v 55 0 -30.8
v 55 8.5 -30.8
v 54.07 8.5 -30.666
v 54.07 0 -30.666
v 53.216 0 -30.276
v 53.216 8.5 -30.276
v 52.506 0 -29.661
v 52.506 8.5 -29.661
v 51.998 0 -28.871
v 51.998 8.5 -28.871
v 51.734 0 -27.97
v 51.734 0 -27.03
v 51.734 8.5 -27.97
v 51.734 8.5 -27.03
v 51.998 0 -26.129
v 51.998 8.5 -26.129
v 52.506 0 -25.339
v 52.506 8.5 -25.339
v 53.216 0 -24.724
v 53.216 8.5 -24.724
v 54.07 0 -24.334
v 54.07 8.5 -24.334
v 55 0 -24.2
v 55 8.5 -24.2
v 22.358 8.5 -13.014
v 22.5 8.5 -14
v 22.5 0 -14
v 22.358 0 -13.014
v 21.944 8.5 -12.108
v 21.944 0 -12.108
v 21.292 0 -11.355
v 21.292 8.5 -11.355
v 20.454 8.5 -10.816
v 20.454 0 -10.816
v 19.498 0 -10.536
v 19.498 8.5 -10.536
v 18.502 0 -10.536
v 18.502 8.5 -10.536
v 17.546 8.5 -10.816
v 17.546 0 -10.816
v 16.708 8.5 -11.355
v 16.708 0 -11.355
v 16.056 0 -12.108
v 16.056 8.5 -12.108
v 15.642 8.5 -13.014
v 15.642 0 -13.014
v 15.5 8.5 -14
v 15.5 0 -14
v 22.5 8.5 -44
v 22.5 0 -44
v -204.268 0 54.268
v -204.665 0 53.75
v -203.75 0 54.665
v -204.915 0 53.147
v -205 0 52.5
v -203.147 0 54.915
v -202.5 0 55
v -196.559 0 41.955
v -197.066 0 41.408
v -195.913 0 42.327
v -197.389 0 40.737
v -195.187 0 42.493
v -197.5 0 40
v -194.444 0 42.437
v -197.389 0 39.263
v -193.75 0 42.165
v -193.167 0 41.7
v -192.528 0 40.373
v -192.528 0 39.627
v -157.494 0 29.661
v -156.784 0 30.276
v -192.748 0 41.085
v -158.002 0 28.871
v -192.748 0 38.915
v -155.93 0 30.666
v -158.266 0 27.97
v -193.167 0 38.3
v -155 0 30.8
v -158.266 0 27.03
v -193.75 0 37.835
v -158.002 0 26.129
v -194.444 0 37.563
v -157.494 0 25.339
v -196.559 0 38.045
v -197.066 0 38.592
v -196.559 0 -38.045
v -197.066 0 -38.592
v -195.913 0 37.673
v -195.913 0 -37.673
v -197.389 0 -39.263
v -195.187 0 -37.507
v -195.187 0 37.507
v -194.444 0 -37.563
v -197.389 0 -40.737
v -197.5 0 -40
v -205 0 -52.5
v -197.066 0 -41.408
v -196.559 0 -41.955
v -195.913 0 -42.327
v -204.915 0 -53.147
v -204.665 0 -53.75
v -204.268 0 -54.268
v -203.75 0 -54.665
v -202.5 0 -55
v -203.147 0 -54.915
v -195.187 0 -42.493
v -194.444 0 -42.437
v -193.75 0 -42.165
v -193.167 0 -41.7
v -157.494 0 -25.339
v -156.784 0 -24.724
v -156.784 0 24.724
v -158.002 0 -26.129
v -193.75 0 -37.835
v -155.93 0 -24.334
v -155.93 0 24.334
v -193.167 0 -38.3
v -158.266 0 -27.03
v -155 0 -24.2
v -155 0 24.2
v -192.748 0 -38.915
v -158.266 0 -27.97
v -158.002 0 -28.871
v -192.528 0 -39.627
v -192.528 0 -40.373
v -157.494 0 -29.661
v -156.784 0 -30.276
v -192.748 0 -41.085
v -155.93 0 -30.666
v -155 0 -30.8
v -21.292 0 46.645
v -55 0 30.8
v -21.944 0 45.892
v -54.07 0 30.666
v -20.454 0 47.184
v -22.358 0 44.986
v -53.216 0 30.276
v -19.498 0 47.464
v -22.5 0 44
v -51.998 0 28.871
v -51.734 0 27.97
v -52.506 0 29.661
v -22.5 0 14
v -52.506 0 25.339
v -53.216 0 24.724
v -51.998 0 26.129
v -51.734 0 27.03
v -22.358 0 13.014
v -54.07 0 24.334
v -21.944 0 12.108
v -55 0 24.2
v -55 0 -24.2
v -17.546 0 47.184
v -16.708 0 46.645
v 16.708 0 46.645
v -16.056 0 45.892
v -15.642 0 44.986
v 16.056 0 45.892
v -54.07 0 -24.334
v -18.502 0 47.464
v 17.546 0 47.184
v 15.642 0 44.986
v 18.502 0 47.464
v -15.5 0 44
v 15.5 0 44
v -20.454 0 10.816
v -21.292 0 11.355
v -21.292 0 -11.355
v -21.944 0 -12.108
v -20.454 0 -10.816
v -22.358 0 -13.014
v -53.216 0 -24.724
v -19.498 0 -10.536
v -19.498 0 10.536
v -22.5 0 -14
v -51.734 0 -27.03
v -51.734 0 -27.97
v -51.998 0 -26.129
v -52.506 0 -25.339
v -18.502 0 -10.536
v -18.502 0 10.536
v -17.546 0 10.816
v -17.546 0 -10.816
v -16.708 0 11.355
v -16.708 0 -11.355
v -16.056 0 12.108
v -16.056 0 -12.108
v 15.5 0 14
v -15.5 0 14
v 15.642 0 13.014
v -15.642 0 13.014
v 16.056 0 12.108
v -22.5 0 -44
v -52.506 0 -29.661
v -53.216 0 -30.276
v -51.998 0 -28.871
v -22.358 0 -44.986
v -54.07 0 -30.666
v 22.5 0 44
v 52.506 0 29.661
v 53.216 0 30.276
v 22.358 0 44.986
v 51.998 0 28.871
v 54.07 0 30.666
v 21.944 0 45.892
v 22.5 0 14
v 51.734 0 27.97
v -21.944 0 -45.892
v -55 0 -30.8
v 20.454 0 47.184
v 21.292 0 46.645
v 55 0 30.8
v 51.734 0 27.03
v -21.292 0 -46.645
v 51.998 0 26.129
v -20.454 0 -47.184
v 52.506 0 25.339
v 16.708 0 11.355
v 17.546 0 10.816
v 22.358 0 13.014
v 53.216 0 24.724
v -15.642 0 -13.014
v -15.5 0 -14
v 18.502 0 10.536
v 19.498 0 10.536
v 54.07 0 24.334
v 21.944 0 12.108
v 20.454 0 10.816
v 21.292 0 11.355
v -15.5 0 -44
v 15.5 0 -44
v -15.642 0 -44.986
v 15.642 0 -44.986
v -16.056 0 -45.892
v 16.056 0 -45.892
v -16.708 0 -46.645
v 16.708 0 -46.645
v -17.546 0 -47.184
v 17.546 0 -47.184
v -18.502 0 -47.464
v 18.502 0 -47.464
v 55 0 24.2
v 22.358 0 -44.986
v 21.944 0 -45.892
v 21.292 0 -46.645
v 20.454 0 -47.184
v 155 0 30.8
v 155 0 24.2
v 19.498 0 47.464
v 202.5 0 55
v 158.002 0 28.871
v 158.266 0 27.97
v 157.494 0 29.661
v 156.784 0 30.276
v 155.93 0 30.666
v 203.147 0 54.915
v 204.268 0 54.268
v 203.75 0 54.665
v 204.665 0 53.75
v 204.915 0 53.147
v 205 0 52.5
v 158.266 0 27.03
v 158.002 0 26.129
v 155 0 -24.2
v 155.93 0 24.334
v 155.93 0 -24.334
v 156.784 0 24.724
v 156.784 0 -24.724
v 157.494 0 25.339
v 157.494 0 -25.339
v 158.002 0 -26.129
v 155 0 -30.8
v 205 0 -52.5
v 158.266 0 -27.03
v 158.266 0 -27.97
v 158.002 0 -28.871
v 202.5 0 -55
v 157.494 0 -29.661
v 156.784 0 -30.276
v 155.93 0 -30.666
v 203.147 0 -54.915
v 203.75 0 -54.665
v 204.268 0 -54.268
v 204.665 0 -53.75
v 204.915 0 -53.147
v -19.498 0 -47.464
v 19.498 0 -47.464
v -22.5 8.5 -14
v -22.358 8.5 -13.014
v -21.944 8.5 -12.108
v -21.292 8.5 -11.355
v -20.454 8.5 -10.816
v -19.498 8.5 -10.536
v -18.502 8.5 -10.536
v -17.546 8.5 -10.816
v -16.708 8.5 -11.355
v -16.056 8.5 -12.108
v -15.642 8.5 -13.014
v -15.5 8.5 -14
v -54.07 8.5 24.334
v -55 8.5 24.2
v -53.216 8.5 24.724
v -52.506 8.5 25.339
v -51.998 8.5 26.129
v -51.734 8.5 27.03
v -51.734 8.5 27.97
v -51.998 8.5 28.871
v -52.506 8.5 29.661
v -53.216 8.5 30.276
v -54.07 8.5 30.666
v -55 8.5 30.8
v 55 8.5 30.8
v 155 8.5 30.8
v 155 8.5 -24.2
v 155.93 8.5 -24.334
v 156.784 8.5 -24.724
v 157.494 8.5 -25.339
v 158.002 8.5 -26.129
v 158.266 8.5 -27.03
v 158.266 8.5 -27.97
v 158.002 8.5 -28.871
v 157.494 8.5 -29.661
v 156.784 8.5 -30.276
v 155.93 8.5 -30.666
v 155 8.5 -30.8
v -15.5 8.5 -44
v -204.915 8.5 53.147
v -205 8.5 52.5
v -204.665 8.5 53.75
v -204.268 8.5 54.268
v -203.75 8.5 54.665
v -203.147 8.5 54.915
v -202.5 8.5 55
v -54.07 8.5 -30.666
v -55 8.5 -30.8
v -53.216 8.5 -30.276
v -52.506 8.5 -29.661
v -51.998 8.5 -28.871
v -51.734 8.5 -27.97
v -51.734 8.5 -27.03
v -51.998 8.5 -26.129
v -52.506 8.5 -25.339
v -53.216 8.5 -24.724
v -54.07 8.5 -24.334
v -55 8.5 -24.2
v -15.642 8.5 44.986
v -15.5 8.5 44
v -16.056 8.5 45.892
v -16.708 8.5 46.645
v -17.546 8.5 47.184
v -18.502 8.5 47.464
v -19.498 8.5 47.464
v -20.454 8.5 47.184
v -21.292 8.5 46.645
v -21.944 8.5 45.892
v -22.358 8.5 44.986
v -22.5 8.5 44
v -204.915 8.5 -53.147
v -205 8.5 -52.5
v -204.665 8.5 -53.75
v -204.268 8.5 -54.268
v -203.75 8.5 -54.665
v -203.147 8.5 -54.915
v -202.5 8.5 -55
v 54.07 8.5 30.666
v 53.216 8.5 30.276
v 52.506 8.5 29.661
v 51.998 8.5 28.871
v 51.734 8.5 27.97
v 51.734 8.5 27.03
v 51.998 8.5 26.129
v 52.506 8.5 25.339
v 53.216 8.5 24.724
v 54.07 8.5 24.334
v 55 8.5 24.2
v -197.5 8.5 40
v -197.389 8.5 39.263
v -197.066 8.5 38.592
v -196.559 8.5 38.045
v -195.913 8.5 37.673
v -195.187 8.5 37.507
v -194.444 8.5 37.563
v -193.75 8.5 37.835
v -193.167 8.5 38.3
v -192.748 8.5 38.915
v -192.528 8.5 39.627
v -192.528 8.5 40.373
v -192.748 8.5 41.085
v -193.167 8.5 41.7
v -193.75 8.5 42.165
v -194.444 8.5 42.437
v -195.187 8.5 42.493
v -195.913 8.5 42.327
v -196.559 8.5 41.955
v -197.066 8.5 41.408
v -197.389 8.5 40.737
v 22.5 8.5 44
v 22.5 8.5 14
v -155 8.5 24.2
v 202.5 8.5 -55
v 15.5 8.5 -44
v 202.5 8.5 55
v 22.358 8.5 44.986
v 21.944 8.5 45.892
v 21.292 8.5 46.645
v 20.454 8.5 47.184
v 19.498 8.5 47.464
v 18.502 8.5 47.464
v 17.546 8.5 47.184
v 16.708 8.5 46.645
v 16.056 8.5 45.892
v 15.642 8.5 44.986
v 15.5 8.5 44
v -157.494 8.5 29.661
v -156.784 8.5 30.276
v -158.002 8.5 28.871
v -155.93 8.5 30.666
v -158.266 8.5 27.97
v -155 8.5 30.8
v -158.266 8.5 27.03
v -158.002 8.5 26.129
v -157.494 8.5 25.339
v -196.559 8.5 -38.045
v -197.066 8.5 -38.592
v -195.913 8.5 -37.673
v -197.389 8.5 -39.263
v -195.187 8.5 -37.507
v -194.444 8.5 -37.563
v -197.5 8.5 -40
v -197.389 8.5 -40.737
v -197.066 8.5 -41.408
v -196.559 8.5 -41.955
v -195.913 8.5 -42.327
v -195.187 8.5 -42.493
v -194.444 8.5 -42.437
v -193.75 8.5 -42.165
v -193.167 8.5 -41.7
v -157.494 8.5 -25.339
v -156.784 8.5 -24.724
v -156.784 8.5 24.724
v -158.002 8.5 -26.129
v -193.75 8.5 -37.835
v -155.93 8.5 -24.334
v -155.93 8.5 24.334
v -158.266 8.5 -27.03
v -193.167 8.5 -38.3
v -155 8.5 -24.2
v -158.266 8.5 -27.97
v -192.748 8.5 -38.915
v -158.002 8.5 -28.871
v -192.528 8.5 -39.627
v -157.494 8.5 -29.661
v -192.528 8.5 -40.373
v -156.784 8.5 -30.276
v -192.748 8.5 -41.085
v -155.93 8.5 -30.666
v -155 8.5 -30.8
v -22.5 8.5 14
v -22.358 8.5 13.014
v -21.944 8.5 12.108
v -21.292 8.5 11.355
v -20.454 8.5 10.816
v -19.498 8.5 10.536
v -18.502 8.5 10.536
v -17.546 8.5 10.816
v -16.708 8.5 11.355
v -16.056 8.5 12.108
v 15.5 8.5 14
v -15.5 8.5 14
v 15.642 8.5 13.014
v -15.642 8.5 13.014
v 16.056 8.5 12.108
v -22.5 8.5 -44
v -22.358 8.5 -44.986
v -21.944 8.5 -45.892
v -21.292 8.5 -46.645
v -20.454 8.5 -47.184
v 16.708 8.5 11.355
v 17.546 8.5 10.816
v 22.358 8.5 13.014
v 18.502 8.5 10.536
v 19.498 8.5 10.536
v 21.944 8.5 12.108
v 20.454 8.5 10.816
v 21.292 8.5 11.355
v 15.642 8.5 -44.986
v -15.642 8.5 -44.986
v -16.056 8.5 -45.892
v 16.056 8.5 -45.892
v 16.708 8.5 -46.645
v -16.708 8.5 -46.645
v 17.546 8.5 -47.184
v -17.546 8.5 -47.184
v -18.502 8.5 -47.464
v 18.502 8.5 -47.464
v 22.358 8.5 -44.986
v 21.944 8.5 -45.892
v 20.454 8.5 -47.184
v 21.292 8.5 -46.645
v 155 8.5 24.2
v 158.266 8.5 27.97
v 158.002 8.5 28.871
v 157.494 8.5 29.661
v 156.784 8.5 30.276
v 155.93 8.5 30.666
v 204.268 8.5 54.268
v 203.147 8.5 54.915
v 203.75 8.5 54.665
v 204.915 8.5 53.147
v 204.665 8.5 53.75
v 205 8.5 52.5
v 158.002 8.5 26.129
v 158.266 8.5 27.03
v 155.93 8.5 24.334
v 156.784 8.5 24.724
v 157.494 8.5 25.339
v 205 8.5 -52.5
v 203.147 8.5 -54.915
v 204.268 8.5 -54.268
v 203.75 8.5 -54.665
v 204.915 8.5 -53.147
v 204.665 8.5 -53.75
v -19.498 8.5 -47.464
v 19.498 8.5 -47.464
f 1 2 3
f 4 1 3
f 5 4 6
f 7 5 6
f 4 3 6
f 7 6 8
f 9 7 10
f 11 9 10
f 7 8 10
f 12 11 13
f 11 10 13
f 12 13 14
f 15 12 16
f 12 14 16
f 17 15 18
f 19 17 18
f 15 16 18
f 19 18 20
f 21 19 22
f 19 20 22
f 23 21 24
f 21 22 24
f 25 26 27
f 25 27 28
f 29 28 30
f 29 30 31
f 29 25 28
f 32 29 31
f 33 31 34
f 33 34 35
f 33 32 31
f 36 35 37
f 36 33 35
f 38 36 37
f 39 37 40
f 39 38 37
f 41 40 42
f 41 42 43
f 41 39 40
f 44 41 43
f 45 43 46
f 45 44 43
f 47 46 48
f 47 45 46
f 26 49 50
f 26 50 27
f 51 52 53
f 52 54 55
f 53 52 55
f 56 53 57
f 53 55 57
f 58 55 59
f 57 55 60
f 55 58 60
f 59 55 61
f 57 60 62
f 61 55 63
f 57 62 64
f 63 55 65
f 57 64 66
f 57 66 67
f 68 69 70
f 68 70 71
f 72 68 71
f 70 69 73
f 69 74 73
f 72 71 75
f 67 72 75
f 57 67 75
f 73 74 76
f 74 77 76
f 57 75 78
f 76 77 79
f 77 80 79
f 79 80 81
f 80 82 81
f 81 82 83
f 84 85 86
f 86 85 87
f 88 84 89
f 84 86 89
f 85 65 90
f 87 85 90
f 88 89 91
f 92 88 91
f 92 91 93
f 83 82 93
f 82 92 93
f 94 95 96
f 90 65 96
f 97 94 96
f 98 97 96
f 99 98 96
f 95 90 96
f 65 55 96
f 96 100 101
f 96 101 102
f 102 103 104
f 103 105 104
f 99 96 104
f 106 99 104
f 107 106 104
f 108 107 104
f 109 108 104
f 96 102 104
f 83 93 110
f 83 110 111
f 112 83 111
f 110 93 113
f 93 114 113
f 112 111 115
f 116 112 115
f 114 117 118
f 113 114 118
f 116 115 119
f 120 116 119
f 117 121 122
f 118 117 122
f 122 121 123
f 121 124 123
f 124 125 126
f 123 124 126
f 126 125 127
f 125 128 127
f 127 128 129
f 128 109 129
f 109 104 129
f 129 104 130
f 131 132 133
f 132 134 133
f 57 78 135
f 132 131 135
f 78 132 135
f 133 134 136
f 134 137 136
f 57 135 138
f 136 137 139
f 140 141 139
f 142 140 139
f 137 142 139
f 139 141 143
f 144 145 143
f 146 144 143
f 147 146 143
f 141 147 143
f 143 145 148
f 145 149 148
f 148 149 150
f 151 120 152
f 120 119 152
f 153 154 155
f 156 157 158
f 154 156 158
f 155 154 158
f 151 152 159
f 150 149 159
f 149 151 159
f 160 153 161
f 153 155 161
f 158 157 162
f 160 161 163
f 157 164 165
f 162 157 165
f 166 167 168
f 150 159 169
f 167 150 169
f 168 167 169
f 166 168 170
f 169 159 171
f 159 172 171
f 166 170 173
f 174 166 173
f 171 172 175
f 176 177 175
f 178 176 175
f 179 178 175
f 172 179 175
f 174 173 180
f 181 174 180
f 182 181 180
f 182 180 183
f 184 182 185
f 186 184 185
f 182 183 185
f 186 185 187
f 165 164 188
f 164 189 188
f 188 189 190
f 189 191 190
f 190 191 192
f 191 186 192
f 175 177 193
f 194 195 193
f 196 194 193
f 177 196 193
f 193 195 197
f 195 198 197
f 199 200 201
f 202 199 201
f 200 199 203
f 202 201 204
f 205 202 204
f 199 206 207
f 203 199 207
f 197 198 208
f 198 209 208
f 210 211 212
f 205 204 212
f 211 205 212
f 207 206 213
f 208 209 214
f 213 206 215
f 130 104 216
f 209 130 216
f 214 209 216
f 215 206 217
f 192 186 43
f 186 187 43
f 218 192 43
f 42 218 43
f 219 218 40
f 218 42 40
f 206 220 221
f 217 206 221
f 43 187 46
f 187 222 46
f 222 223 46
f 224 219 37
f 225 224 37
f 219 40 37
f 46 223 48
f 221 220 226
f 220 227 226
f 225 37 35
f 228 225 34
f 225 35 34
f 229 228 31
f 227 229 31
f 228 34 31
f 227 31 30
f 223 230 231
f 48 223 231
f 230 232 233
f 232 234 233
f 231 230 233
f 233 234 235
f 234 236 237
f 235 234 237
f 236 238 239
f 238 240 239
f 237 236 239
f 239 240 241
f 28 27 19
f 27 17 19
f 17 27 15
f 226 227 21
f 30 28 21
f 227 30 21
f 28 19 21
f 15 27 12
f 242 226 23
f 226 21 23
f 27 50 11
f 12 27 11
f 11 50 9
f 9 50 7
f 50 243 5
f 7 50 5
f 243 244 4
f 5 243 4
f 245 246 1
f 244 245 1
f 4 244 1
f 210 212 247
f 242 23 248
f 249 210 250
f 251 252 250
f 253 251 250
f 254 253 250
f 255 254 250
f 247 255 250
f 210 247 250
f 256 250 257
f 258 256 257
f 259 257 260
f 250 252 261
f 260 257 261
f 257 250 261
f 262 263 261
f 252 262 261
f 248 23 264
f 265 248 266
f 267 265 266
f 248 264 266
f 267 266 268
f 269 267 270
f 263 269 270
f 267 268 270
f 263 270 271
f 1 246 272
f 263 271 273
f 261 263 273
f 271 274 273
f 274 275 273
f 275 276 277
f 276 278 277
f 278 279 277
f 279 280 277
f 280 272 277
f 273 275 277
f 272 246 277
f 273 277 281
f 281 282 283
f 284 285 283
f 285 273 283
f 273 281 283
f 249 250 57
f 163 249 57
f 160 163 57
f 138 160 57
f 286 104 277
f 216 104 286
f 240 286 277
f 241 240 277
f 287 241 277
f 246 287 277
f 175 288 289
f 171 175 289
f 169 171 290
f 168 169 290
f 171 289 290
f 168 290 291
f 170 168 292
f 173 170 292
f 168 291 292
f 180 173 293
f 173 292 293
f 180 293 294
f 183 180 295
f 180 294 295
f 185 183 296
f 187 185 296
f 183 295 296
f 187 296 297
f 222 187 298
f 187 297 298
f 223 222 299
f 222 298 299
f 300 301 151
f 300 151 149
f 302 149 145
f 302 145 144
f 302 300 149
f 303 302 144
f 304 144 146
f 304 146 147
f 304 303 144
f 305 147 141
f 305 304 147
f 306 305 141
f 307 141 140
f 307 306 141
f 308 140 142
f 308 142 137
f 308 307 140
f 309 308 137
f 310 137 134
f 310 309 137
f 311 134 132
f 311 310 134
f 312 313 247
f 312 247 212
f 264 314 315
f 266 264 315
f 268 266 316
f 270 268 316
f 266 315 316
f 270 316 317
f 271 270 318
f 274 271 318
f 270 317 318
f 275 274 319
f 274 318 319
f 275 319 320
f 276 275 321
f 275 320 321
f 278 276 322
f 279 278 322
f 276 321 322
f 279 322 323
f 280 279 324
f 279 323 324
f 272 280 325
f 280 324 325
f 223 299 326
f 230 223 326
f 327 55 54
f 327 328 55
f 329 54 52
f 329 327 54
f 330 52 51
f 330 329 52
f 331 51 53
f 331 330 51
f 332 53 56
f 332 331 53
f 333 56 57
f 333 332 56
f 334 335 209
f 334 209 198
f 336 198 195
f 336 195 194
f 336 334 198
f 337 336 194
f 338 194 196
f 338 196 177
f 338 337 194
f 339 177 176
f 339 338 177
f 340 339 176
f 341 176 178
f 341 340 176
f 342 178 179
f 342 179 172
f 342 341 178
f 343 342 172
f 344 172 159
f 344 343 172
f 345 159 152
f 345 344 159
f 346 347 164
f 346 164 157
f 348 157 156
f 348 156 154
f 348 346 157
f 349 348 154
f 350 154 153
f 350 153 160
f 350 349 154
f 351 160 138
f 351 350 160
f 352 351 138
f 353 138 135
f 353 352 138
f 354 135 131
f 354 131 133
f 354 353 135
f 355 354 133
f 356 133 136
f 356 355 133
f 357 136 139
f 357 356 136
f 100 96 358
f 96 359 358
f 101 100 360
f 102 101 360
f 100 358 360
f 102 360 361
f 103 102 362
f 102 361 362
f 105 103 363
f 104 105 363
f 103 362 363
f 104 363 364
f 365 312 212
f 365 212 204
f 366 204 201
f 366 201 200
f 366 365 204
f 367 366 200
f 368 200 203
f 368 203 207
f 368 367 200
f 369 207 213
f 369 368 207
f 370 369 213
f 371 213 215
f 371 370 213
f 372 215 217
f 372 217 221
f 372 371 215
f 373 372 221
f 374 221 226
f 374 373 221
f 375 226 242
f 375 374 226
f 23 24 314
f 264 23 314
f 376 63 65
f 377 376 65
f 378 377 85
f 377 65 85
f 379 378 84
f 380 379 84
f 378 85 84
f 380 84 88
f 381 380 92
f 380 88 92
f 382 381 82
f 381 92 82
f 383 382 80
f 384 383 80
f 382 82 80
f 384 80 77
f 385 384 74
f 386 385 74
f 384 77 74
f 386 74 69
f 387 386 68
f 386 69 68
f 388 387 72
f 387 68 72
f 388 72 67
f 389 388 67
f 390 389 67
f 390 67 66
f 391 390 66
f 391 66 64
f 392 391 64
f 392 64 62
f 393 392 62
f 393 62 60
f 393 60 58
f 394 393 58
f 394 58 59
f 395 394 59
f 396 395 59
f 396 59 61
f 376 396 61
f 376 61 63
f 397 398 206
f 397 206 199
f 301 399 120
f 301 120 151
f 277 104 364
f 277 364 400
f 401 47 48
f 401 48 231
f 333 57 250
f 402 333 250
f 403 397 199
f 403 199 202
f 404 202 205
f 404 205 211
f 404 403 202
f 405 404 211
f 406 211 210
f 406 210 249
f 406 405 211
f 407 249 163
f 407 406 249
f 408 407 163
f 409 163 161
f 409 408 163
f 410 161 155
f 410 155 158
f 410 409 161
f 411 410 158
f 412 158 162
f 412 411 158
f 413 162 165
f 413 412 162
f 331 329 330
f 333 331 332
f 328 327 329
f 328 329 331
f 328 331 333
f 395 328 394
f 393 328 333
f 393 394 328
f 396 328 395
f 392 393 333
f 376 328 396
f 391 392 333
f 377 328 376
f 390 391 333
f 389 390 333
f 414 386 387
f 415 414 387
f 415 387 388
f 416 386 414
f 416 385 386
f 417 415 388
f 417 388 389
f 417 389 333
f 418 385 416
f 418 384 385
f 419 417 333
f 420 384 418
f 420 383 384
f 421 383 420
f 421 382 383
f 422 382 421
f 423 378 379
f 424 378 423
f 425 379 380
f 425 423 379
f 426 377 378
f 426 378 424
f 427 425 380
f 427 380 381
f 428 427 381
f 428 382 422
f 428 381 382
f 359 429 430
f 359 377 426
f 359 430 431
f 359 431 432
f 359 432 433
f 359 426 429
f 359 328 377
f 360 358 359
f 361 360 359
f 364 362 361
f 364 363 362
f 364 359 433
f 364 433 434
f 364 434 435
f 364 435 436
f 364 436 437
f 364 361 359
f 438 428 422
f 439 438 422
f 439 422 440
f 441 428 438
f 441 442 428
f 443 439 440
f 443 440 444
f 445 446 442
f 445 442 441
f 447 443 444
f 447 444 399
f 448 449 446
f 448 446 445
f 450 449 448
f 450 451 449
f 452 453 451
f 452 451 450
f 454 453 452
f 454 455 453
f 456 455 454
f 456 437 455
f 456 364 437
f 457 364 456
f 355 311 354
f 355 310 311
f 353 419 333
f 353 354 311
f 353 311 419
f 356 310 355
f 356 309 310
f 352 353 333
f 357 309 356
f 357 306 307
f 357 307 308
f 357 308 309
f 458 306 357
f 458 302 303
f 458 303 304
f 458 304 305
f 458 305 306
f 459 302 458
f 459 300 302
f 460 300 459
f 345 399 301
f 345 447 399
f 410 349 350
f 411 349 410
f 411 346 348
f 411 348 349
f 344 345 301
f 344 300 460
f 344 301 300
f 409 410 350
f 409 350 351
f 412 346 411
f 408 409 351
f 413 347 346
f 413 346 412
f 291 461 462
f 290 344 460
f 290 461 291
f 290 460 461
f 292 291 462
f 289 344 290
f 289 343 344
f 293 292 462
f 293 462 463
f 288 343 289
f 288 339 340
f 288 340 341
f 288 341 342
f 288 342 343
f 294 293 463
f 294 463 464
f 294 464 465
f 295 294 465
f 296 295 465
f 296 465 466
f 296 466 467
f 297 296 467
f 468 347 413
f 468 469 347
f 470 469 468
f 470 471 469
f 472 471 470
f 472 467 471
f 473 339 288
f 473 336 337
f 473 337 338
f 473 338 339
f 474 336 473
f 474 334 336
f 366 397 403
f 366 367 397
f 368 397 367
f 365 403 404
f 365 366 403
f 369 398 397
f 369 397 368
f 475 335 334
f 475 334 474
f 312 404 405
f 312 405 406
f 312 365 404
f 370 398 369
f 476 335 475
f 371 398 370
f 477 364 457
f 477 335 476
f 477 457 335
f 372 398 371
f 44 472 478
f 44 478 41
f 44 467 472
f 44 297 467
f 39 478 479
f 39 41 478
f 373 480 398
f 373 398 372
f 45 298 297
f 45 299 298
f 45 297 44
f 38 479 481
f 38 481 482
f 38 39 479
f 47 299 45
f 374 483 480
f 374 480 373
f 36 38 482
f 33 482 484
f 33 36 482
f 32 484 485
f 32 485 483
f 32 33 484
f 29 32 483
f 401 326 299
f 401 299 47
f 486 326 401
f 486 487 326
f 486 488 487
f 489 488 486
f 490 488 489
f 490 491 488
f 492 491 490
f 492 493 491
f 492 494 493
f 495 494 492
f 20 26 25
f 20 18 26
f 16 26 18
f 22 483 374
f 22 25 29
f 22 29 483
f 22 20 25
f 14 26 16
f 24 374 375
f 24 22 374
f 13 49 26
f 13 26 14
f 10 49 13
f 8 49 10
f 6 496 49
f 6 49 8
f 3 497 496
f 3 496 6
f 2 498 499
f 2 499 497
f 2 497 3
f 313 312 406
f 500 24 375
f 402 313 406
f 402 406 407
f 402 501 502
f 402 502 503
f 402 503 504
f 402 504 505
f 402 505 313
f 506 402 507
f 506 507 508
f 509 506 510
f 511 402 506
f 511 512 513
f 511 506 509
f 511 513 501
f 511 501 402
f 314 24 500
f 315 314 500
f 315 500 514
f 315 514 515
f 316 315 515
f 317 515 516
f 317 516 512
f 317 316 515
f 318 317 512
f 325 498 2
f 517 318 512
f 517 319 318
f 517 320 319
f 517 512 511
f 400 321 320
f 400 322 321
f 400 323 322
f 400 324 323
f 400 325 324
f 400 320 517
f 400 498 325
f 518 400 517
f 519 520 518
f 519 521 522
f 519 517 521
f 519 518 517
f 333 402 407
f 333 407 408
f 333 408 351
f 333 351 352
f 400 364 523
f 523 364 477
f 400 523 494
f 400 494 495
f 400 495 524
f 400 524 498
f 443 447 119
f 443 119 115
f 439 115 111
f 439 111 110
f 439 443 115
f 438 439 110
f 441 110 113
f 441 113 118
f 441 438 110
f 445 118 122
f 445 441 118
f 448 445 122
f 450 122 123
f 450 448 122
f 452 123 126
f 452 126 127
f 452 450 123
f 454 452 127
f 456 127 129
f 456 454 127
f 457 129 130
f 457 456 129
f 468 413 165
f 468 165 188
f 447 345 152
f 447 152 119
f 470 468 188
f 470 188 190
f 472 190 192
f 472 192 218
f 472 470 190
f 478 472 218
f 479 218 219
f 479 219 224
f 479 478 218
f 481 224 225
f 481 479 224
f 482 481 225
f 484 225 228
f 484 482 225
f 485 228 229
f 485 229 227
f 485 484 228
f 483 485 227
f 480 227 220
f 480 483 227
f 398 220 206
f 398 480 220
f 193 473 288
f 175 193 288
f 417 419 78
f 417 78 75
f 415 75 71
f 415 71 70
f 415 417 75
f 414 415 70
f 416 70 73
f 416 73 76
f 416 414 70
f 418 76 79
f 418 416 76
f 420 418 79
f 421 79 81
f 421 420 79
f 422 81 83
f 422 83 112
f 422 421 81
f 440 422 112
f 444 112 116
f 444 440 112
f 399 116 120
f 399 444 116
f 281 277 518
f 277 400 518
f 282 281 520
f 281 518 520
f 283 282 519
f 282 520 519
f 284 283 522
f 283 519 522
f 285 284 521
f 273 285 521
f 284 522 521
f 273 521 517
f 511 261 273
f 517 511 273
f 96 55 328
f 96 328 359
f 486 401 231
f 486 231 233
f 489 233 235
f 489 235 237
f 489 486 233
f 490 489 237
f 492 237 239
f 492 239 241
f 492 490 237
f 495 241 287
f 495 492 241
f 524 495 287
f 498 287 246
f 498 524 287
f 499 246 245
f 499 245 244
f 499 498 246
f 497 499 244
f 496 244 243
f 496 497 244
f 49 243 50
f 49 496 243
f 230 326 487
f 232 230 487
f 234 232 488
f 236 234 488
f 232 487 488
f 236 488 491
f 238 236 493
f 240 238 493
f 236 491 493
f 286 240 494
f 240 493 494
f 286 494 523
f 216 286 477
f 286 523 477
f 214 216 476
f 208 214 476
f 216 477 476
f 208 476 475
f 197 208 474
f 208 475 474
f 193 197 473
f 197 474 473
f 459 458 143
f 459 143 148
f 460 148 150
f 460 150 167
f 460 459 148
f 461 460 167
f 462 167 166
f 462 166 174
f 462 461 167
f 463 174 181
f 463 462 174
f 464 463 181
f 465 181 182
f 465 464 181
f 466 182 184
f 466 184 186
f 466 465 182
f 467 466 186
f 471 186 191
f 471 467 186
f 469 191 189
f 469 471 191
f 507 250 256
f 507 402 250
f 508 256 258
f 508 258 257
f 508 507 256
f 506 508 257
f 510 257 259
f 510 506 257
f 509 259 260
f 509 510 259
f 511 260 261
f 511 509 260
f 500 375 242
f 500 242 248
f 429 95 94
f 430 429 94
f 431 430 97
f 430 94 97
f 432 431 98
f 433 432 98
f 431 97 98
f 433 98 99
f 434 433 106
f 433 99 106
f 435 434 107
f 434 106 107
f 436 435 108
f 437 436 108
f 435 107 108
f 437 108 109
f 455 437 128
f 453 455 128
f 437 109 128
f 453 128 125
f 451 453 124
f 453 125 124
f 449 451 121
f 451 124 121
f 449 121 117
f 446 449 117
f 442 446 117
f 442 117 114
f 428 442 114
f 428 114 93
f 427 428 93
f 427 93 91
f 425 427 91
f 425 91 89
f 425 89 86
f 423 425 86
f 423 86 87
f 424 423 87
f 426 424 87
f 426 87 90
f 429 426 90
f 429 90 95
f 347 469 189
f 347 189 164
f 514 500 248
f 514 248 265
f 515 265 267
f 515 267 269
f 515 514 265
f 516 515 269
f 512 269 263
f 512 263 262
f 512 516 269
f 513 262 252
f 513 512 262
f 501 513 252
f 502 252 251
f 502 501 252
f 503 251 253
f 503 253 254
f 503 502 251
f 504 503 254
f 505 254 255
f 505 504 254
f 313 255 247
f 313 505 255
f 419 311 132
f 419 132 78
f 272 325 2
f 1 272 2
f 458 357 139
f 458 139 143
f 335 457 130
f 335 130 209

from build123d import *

# Parameters (mm, degrees)
SKETCH1_W            = 410
SKETCH1_H            = 110
BOSS_EXTRUDE1_DEPTH  = 8.5
M4_CLEARANCE_HOLE1_D = 5
M6_CLEARANCE_HOLE1_D = 7
FILLET1_R            = 2.5
CUT_EXTRUDE1_DEPTH   = 8.5
CUT_EXTRUDE2_DEPTH   = 8.5


with BuildPart() as part:
    # Sketch1 → Boss-Extrude1 (new body)
    with BuildSketch(Plane(origin=(0, 0, 0), x_dir=(1, 0, 0), z_dir=(0, 1, 0))):
        Rectangle(SKETCH1_W, SKETCH1_H)
    extrude(amount=BOSS_EXTRUDE1_DEPTH)

    # M4 Clearance Hole1 (through all)
    with Locations(Plane(origin=(0, 8.5, 0), x_dir=(1, 0, 0), z_dir=(0, 1, 0))):
        with Locations((-195, -40), (-195, 40)):
            Hole(M4_CLEARANCE_HOLE1_D / 2)

    # M6 Clearance Hole1 (through all)
    with Locations(Plane(origin=(0, 8.5, 0), x_dir=(1, 0, 0), z_dir=(0, 1, 0))):
        with Locations((19, 34), (19, -34), (-19, -34), (-19, 34)):
            Hole(M6_CLEARANCE_HOLE1_D / 2)

    # Fillet1
    fillet1_edges = [part.edges().sort_by_distance(p)[0] for p in [
        (205, 4.25, 55),
        (-205, 4.25, 55),
        (-205, 4.25, -55),
        (205, 4.25, -55),
    ]]
    fillet(fillet1_edges, radius=FILLET1_R)

    # Sketch6 → Cut-Extrude1 (cut)
    with BuildSketch(Plane(origin=(0, 8.5, 0), x_dir=(1, 0, 0), z_dir=(0, 1, 0))):
        with BuildLine():
            Line((-22.5, 34), (-22.5, 14))
            ThreePointArc((-22.5, 14), (-19, 10.5), (-15.5, 14))
            Line((-15.5, 14), (-15.5, 34))
            Line((-15.5, 34), (-15.5, 44))
            ThreePointArc((-15.5, 44), (-19, 47.5), (-22.5, 44))
            Line((-22.5, 44), (-22.5, 34))
        make_face()
        with BuildLine():
            Line((22.5, 34), (22.5, 14))
            ThreePointArc((22.5, 14), (19, 10.5), (15.5, 14))
            Line((15.5, 14), (15.5, 34))
            Line((15.5, 34), (15.5, 44))
            ThreePointArc((15.5, 44), (19, 47.5), (22.5, 44))
            Line((22.5, 44), (22.5, 34))
        make_face()
        with BuildLine():
            Line((-22.5, -44), (-22.5, -34))
            Line((-22.5, -34), (-22.5, -14))
            ThreePointArc((-22.5, -14), (-19, -10.5), (-15.5, -14))
            Line((-15.5, -14), (-15.5, -34))
            Line((-15.5, -34), (-15.5, -44))
            ThreePointArc((-15.5, -44), (-19, -47.5), (-22.5, -44))
        make_face()
        with BuildLine():
            Line((15.5, -44), (15.5, -34))
            Line((15.5, -34), (15.5, -14))
            ThreePointArc((15.5, -14), (19, -10.5), (22.5, -14))
            Line((22.5, -14), (22.5, -34))
            Line((22.5, -34), (22.5, -44))
            ThreePointArc((22.5, -44), (19, -47.5), (15.5, -44))
        make_face()
    extrude(amount=-CUT_EXTRUDE1_DEPTH, mode=Mode.SUBTRACT)

    # Sketch7 → Cut-Extrude2 (cut)
    with BuildSketch(Plane(origin=(0, 8.5, 0), x_dir=(1, 0, 0), z_dir=(0, 1, 0))):
        with BuildLine():
            Line((-155, 30.8), (-55, 30.8))
            ThreePointArc((-55, 30.8), (-51.7, 27.5), (-55, 24.2))
            Line((-55, 24.2), (-155, 24.2))
            ThreePointArc((-155, 24.2), (-158.3, 27.5), (-155, 30.8))
        make_face()
        with BuildLine():
            Line((-155, -24.2), (-55, -24.2))
            ThreePointArc((-55, -24.2), (-51.7, -27.5), (-55, -30.8))
            Line((-55, -30.8), (-155, -30.8))
            ThreePointArc((-155, -30.8), (-158.3, -27.5), (-155, -24.2))
        make_face()
        with BuildLine():
            Line((55, -24.2), (155, -24.2))
            ThreePointArc((155, -24.2), (158.3, -27.5), (155, -30.8))
            Line((155, -30.8), (55, -30.8))
            ThreePointArc((55, -30.8), (51.7, -27.5), (55, -24.2))
        make_face()
        with BuildLine():
            Line((155, 30.8), (55, 30.8))
            ThreePointArc((55, 30.8), (51.7, 27.5), (55, 24.2))
            Line((55, 24.2), (155, 24.2))
            ThreePointArc((155, 24.2), (158.3, 27.5), (155, 30.8))
        make_face()
    extrude(amount=-CUT_EXTRUDE2_DEPTH, mode=Mode.SUBTRACT)


solid = part.part
